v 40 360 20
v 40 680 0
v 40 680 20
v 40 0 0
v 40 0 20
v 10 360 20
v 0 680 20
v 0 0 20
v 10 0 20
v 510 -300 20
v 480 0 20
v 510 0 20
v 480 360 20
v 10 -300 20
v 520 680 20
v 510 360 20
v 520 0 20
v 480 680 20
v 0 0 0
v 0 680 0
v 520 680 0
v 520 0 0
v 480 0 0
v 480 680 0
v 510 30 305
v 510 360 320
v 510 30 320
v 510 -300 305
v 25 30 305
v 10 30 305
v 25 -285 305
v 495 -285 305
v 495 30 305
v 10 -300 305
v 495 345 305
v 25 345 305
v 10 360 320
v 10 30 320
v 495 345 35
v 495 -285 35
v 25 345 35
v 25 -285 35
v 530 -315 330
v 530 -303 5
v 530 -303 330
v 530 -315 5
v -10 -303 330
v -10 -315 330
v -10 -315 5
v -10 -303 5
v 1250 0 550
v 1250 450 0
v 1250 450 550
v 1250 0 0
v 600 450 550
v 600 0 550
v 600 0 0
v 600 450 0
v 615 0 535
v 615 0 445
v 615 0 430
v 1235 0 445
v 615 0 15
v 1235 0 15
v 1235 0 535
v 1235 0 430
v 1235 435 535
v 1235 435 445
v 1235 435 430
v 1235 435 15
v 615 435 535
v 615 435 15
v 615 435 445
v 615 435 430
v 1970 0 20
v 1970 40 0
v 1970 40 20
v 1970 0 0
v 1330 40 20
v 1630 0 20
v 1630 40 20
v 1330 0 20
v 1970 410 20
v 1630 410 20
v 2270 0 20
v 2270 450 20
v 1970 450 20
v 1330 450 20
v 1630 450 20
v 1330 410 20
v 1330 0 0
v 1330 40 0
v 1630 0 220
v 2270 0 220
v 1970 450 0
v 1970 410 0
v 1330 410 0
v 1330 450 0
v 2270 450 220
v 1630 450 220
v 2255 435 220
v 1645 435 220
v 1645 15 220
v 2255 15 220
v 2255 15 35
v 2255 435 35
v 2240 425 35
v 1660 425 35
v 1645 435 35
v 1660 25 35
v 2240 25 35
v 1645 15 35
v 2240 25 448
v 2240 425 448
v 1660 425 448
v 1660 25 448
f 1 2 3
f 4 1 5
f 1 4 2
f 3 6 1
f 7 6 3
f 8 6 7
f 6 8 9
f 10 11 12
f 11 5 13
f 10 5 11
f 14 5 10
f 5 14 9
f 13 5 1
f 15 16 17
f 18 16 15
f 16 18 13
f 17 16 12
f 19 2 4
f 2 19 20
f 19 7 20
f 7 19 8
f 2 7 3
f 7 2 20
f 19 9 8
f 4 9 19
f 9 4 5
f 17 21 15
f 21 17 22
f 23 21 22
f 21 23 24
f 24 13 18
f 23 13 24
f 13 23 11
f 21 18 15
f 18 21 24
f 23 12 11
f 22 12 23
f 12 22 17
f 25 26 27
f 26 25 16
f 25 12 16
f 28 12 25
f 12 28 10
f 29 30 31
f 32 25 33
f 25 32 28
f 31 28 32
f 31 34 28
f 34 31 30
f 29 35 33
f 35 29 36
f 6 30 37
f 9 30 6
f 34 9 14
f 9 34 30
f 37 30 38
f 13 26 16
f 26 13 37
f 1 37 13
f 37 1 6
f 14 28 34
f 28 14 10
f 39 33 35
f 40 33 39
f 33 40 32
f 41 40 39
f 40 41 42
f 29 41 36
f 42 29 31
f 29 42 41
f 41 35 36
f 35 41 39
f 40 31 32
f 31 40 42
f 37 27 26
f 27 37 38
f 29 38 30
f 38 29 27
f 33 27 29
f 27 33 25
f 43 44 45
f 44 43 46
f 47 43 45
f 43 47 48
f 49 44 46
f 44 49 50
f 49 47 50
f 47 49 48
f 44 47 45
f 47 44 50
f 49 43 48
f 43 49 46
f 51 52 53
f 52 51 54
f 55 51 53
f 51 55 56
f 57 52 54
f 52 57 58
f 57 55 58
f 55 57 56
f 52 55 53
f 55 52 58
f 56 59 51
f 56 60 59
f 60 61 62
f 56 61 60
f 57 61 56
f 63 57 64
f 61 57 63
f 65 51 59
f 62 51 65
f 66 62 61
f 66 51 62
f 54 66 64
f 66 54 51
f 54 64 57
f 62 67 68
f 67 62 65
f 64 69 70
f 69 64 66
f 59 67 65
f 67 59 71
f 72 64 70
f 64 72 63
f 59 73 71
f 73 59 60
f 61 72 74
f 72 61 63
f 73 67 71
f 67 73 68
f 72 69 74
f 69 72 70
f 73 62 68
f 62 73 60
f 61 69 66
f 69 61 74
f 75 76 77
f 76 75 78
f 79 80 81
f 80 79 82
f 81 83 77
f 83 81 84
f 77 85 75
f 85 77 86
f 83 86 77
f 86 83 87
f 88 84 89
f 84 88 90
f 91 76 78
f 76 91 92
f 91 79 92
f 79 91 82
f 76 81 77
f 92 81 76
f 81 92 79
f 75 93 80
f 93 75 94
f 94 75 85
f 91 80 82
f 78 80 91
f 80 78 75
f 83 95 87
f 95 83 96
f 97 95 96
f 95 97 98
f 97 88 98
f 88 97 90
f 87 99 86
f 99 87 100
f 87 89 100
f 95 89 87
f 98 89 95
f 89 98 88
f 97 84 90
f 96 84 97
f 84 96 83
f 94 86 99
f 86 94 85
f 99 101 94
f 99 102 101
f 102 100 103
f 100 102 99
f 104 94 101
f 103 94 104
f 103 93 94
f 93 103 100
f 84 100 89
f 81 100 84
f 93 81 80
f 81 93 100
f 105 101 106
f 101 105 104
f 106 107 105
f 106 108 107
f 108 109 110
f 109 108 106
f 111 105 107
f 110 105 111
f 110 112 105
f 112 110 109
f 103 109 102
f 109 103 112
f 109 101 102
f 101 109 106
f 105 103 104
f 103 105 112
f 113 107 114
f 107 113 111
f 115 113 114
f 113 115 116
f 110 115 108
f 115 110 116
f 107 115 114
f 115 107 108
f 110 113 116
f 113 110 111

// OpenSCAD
/*
 * Offroad Adventure Trailer - Left-Side Galley Modules
 *
 * Three units along the LEFT side (all consumers electric — propane stays
 * on fixed pipes to the right-side quick-connects):
 *
 *   1. kitchen_drawer(pullout)  — FRONT LEFT, slides out SIDEWAYS (-Y)
 *      through an opening in the left wall. Structural only: slides,
 *      plywood box, worktop and drawer front (no taps/stove modeled).
 *   2. storage_cabinet()        — MID LEFT, fixed plywood cabinet for
 *      utensils/dry goods; also houses the removable power-station box.
 *      Accessed through a door in the left wall (cut in cabin.scad).
 *   3. fridge_drawer(pullout)   — REAR LEFT, fridge-sized drawer that
 *      slides out (+X) through the rear hatch. 12V compressor fridge
 *      (Dometic CFX3 45 class) strapped into a low plywood tray.
 *
 * All origins = front-bottom-left of the CLOSED unit, sitting on the
 * cabin floor. `pullout` extends a drawer for visualization.
 */

ply = 15;            // plywood wall thickness
slide_h = 20;        // heavy-duty slide rail height
rail_w = 40;         // slide rail width
fridge = [580, 400, 413];   // CFX3 45 class, approx

// ------------------------------------------------------------------
// 1. Kitchen side-drawer (travel along -Y, out through the left wall)
//    Footprint 520 (X) x 680 (Y). Wall opening: x 60-580, 330 tall.
// ------------------------------------------------------------------
kd_x = 520;          // unit width along the wall
kd_y = 680;          // drawer length = slide length (travel direction)
kd_h = 300;          // box height incl. worktop

module kitchen_drawer(pullout = 0) {
    // Fixed slide rails on the floor, running in Y
    color("silver")
        for (x = [0, kd_x - rail_w])
            translate([x, 0, 0])
                cube([rail_w, kd_y, slide_h]);

    translate([0, -pullout, 0]) {
        // Plywood box, open top (worktop covers the rear half)
        color("BurlyWood") {
            difference() {
                translate([10, 0, slide_h])
                    cube([kd_x - 20, kd_y - 20, kd_h - ply]);
                translate([10 + ply, ply, slide_h + ply])
                    cube([kd_x - 20 - 2*ply, kd_y - 20 - 2*ply, kd_h]);
            }
            // Worktop over the inner (rear) half — front half is open bins
            translate([10, (kd_y - 20)/2, slide_h + kd_h - ply])
                cube([kd_x - 20, (kd_y - 20)/2, ply]);
        }

        // Drawer front — overlay panel sitting PROUD of the 3 mm wall
        // (wall outer face is at y=-3 in the assembly; panel at -15..-3)
        color("Peru")
            translate([-10, -15, slide_h - 15])
                cube([kd_x + 20, 12, kd_h + 25]);
    }
}

// ------------------------------------------------------------------
// 2. Storage cabinet (fixed), mid left: 650 x 450 x 550
//    Door opening in the left wall at x 780-1240 (cut in cabin.scad);
//    the electrical niche (x 600-760) shares the cabinet's front bay.
// ------------------------------------------------------------------
sc_x = 650;
sc_y = 450;
sc_h = 550;

module storage_cabinet() {
    color("Tan") {
        difference() {
            cube([sc_x, sc_y, sc_h]);
            // Hollow interior
            translate([ply, -1, ply])
                cube([sc_x - 2*ply, sc_y - ply + 1, sc_h - 2*ply]);
            // Door opening toward the left wall (-Y is wall side; the
            // wall itself carries the hinged door — see cabin.scad)
        }
        // Mid shelf above the power-station box
        translate([ply, 0, 430])
            cube([sc_x - 2*ply, sc_y - ply, ply]);
    }
}

// ------------------------------------------------------------------
// 3. Fridge drawer (travel along +X, out through the rear hatch)
//    Low tray, fridge-sized only: outer 640 x 450.
// ------------------------------------------------------------------
fd_x = 640;          // tray length = slide length
fd_y = 450;
fd_wall = 200;       // low sides — fridge is strapped, lid must clear

module fridge_drawer(pullout = 0) {
    // Fixed slide rails on the floor, running in X
    color("silver")
        for (y = [0, fd_y - rail_w])
            translate([0, y, 0])
                cube([fd_x, rail_w, slide_h]);

    translate([pullout, 0, 0]) {
        // Plywood tray
        color("BurlyWood")
            difference() {
                translate([0, 0, slide_h])
                    cube([fd_x, fd_y, fd_wall]);
                translate([ply, ply, slide_h + ply])
                    cube([fd_x - 2*ply, fd_y - 2*ply, fd_wall + 1]);
            }
        // 12V compressor fridge (lid opens upward when pulled out)
        color("DarkSlateGray")
            translate([(fd_x - fridge[0])/2, (fd_y - fridge[1])/2, slide_h + ply])
                cube(fridge);
    }
}

// Renders if the file is opened standalone (drawers half extended)
kitchen_drawer(pullout = 300);
translate([600, 0, 0]) storage_cabinet();
translate([1330, 0, 0]) fridge_drawer(pullout = 300);
